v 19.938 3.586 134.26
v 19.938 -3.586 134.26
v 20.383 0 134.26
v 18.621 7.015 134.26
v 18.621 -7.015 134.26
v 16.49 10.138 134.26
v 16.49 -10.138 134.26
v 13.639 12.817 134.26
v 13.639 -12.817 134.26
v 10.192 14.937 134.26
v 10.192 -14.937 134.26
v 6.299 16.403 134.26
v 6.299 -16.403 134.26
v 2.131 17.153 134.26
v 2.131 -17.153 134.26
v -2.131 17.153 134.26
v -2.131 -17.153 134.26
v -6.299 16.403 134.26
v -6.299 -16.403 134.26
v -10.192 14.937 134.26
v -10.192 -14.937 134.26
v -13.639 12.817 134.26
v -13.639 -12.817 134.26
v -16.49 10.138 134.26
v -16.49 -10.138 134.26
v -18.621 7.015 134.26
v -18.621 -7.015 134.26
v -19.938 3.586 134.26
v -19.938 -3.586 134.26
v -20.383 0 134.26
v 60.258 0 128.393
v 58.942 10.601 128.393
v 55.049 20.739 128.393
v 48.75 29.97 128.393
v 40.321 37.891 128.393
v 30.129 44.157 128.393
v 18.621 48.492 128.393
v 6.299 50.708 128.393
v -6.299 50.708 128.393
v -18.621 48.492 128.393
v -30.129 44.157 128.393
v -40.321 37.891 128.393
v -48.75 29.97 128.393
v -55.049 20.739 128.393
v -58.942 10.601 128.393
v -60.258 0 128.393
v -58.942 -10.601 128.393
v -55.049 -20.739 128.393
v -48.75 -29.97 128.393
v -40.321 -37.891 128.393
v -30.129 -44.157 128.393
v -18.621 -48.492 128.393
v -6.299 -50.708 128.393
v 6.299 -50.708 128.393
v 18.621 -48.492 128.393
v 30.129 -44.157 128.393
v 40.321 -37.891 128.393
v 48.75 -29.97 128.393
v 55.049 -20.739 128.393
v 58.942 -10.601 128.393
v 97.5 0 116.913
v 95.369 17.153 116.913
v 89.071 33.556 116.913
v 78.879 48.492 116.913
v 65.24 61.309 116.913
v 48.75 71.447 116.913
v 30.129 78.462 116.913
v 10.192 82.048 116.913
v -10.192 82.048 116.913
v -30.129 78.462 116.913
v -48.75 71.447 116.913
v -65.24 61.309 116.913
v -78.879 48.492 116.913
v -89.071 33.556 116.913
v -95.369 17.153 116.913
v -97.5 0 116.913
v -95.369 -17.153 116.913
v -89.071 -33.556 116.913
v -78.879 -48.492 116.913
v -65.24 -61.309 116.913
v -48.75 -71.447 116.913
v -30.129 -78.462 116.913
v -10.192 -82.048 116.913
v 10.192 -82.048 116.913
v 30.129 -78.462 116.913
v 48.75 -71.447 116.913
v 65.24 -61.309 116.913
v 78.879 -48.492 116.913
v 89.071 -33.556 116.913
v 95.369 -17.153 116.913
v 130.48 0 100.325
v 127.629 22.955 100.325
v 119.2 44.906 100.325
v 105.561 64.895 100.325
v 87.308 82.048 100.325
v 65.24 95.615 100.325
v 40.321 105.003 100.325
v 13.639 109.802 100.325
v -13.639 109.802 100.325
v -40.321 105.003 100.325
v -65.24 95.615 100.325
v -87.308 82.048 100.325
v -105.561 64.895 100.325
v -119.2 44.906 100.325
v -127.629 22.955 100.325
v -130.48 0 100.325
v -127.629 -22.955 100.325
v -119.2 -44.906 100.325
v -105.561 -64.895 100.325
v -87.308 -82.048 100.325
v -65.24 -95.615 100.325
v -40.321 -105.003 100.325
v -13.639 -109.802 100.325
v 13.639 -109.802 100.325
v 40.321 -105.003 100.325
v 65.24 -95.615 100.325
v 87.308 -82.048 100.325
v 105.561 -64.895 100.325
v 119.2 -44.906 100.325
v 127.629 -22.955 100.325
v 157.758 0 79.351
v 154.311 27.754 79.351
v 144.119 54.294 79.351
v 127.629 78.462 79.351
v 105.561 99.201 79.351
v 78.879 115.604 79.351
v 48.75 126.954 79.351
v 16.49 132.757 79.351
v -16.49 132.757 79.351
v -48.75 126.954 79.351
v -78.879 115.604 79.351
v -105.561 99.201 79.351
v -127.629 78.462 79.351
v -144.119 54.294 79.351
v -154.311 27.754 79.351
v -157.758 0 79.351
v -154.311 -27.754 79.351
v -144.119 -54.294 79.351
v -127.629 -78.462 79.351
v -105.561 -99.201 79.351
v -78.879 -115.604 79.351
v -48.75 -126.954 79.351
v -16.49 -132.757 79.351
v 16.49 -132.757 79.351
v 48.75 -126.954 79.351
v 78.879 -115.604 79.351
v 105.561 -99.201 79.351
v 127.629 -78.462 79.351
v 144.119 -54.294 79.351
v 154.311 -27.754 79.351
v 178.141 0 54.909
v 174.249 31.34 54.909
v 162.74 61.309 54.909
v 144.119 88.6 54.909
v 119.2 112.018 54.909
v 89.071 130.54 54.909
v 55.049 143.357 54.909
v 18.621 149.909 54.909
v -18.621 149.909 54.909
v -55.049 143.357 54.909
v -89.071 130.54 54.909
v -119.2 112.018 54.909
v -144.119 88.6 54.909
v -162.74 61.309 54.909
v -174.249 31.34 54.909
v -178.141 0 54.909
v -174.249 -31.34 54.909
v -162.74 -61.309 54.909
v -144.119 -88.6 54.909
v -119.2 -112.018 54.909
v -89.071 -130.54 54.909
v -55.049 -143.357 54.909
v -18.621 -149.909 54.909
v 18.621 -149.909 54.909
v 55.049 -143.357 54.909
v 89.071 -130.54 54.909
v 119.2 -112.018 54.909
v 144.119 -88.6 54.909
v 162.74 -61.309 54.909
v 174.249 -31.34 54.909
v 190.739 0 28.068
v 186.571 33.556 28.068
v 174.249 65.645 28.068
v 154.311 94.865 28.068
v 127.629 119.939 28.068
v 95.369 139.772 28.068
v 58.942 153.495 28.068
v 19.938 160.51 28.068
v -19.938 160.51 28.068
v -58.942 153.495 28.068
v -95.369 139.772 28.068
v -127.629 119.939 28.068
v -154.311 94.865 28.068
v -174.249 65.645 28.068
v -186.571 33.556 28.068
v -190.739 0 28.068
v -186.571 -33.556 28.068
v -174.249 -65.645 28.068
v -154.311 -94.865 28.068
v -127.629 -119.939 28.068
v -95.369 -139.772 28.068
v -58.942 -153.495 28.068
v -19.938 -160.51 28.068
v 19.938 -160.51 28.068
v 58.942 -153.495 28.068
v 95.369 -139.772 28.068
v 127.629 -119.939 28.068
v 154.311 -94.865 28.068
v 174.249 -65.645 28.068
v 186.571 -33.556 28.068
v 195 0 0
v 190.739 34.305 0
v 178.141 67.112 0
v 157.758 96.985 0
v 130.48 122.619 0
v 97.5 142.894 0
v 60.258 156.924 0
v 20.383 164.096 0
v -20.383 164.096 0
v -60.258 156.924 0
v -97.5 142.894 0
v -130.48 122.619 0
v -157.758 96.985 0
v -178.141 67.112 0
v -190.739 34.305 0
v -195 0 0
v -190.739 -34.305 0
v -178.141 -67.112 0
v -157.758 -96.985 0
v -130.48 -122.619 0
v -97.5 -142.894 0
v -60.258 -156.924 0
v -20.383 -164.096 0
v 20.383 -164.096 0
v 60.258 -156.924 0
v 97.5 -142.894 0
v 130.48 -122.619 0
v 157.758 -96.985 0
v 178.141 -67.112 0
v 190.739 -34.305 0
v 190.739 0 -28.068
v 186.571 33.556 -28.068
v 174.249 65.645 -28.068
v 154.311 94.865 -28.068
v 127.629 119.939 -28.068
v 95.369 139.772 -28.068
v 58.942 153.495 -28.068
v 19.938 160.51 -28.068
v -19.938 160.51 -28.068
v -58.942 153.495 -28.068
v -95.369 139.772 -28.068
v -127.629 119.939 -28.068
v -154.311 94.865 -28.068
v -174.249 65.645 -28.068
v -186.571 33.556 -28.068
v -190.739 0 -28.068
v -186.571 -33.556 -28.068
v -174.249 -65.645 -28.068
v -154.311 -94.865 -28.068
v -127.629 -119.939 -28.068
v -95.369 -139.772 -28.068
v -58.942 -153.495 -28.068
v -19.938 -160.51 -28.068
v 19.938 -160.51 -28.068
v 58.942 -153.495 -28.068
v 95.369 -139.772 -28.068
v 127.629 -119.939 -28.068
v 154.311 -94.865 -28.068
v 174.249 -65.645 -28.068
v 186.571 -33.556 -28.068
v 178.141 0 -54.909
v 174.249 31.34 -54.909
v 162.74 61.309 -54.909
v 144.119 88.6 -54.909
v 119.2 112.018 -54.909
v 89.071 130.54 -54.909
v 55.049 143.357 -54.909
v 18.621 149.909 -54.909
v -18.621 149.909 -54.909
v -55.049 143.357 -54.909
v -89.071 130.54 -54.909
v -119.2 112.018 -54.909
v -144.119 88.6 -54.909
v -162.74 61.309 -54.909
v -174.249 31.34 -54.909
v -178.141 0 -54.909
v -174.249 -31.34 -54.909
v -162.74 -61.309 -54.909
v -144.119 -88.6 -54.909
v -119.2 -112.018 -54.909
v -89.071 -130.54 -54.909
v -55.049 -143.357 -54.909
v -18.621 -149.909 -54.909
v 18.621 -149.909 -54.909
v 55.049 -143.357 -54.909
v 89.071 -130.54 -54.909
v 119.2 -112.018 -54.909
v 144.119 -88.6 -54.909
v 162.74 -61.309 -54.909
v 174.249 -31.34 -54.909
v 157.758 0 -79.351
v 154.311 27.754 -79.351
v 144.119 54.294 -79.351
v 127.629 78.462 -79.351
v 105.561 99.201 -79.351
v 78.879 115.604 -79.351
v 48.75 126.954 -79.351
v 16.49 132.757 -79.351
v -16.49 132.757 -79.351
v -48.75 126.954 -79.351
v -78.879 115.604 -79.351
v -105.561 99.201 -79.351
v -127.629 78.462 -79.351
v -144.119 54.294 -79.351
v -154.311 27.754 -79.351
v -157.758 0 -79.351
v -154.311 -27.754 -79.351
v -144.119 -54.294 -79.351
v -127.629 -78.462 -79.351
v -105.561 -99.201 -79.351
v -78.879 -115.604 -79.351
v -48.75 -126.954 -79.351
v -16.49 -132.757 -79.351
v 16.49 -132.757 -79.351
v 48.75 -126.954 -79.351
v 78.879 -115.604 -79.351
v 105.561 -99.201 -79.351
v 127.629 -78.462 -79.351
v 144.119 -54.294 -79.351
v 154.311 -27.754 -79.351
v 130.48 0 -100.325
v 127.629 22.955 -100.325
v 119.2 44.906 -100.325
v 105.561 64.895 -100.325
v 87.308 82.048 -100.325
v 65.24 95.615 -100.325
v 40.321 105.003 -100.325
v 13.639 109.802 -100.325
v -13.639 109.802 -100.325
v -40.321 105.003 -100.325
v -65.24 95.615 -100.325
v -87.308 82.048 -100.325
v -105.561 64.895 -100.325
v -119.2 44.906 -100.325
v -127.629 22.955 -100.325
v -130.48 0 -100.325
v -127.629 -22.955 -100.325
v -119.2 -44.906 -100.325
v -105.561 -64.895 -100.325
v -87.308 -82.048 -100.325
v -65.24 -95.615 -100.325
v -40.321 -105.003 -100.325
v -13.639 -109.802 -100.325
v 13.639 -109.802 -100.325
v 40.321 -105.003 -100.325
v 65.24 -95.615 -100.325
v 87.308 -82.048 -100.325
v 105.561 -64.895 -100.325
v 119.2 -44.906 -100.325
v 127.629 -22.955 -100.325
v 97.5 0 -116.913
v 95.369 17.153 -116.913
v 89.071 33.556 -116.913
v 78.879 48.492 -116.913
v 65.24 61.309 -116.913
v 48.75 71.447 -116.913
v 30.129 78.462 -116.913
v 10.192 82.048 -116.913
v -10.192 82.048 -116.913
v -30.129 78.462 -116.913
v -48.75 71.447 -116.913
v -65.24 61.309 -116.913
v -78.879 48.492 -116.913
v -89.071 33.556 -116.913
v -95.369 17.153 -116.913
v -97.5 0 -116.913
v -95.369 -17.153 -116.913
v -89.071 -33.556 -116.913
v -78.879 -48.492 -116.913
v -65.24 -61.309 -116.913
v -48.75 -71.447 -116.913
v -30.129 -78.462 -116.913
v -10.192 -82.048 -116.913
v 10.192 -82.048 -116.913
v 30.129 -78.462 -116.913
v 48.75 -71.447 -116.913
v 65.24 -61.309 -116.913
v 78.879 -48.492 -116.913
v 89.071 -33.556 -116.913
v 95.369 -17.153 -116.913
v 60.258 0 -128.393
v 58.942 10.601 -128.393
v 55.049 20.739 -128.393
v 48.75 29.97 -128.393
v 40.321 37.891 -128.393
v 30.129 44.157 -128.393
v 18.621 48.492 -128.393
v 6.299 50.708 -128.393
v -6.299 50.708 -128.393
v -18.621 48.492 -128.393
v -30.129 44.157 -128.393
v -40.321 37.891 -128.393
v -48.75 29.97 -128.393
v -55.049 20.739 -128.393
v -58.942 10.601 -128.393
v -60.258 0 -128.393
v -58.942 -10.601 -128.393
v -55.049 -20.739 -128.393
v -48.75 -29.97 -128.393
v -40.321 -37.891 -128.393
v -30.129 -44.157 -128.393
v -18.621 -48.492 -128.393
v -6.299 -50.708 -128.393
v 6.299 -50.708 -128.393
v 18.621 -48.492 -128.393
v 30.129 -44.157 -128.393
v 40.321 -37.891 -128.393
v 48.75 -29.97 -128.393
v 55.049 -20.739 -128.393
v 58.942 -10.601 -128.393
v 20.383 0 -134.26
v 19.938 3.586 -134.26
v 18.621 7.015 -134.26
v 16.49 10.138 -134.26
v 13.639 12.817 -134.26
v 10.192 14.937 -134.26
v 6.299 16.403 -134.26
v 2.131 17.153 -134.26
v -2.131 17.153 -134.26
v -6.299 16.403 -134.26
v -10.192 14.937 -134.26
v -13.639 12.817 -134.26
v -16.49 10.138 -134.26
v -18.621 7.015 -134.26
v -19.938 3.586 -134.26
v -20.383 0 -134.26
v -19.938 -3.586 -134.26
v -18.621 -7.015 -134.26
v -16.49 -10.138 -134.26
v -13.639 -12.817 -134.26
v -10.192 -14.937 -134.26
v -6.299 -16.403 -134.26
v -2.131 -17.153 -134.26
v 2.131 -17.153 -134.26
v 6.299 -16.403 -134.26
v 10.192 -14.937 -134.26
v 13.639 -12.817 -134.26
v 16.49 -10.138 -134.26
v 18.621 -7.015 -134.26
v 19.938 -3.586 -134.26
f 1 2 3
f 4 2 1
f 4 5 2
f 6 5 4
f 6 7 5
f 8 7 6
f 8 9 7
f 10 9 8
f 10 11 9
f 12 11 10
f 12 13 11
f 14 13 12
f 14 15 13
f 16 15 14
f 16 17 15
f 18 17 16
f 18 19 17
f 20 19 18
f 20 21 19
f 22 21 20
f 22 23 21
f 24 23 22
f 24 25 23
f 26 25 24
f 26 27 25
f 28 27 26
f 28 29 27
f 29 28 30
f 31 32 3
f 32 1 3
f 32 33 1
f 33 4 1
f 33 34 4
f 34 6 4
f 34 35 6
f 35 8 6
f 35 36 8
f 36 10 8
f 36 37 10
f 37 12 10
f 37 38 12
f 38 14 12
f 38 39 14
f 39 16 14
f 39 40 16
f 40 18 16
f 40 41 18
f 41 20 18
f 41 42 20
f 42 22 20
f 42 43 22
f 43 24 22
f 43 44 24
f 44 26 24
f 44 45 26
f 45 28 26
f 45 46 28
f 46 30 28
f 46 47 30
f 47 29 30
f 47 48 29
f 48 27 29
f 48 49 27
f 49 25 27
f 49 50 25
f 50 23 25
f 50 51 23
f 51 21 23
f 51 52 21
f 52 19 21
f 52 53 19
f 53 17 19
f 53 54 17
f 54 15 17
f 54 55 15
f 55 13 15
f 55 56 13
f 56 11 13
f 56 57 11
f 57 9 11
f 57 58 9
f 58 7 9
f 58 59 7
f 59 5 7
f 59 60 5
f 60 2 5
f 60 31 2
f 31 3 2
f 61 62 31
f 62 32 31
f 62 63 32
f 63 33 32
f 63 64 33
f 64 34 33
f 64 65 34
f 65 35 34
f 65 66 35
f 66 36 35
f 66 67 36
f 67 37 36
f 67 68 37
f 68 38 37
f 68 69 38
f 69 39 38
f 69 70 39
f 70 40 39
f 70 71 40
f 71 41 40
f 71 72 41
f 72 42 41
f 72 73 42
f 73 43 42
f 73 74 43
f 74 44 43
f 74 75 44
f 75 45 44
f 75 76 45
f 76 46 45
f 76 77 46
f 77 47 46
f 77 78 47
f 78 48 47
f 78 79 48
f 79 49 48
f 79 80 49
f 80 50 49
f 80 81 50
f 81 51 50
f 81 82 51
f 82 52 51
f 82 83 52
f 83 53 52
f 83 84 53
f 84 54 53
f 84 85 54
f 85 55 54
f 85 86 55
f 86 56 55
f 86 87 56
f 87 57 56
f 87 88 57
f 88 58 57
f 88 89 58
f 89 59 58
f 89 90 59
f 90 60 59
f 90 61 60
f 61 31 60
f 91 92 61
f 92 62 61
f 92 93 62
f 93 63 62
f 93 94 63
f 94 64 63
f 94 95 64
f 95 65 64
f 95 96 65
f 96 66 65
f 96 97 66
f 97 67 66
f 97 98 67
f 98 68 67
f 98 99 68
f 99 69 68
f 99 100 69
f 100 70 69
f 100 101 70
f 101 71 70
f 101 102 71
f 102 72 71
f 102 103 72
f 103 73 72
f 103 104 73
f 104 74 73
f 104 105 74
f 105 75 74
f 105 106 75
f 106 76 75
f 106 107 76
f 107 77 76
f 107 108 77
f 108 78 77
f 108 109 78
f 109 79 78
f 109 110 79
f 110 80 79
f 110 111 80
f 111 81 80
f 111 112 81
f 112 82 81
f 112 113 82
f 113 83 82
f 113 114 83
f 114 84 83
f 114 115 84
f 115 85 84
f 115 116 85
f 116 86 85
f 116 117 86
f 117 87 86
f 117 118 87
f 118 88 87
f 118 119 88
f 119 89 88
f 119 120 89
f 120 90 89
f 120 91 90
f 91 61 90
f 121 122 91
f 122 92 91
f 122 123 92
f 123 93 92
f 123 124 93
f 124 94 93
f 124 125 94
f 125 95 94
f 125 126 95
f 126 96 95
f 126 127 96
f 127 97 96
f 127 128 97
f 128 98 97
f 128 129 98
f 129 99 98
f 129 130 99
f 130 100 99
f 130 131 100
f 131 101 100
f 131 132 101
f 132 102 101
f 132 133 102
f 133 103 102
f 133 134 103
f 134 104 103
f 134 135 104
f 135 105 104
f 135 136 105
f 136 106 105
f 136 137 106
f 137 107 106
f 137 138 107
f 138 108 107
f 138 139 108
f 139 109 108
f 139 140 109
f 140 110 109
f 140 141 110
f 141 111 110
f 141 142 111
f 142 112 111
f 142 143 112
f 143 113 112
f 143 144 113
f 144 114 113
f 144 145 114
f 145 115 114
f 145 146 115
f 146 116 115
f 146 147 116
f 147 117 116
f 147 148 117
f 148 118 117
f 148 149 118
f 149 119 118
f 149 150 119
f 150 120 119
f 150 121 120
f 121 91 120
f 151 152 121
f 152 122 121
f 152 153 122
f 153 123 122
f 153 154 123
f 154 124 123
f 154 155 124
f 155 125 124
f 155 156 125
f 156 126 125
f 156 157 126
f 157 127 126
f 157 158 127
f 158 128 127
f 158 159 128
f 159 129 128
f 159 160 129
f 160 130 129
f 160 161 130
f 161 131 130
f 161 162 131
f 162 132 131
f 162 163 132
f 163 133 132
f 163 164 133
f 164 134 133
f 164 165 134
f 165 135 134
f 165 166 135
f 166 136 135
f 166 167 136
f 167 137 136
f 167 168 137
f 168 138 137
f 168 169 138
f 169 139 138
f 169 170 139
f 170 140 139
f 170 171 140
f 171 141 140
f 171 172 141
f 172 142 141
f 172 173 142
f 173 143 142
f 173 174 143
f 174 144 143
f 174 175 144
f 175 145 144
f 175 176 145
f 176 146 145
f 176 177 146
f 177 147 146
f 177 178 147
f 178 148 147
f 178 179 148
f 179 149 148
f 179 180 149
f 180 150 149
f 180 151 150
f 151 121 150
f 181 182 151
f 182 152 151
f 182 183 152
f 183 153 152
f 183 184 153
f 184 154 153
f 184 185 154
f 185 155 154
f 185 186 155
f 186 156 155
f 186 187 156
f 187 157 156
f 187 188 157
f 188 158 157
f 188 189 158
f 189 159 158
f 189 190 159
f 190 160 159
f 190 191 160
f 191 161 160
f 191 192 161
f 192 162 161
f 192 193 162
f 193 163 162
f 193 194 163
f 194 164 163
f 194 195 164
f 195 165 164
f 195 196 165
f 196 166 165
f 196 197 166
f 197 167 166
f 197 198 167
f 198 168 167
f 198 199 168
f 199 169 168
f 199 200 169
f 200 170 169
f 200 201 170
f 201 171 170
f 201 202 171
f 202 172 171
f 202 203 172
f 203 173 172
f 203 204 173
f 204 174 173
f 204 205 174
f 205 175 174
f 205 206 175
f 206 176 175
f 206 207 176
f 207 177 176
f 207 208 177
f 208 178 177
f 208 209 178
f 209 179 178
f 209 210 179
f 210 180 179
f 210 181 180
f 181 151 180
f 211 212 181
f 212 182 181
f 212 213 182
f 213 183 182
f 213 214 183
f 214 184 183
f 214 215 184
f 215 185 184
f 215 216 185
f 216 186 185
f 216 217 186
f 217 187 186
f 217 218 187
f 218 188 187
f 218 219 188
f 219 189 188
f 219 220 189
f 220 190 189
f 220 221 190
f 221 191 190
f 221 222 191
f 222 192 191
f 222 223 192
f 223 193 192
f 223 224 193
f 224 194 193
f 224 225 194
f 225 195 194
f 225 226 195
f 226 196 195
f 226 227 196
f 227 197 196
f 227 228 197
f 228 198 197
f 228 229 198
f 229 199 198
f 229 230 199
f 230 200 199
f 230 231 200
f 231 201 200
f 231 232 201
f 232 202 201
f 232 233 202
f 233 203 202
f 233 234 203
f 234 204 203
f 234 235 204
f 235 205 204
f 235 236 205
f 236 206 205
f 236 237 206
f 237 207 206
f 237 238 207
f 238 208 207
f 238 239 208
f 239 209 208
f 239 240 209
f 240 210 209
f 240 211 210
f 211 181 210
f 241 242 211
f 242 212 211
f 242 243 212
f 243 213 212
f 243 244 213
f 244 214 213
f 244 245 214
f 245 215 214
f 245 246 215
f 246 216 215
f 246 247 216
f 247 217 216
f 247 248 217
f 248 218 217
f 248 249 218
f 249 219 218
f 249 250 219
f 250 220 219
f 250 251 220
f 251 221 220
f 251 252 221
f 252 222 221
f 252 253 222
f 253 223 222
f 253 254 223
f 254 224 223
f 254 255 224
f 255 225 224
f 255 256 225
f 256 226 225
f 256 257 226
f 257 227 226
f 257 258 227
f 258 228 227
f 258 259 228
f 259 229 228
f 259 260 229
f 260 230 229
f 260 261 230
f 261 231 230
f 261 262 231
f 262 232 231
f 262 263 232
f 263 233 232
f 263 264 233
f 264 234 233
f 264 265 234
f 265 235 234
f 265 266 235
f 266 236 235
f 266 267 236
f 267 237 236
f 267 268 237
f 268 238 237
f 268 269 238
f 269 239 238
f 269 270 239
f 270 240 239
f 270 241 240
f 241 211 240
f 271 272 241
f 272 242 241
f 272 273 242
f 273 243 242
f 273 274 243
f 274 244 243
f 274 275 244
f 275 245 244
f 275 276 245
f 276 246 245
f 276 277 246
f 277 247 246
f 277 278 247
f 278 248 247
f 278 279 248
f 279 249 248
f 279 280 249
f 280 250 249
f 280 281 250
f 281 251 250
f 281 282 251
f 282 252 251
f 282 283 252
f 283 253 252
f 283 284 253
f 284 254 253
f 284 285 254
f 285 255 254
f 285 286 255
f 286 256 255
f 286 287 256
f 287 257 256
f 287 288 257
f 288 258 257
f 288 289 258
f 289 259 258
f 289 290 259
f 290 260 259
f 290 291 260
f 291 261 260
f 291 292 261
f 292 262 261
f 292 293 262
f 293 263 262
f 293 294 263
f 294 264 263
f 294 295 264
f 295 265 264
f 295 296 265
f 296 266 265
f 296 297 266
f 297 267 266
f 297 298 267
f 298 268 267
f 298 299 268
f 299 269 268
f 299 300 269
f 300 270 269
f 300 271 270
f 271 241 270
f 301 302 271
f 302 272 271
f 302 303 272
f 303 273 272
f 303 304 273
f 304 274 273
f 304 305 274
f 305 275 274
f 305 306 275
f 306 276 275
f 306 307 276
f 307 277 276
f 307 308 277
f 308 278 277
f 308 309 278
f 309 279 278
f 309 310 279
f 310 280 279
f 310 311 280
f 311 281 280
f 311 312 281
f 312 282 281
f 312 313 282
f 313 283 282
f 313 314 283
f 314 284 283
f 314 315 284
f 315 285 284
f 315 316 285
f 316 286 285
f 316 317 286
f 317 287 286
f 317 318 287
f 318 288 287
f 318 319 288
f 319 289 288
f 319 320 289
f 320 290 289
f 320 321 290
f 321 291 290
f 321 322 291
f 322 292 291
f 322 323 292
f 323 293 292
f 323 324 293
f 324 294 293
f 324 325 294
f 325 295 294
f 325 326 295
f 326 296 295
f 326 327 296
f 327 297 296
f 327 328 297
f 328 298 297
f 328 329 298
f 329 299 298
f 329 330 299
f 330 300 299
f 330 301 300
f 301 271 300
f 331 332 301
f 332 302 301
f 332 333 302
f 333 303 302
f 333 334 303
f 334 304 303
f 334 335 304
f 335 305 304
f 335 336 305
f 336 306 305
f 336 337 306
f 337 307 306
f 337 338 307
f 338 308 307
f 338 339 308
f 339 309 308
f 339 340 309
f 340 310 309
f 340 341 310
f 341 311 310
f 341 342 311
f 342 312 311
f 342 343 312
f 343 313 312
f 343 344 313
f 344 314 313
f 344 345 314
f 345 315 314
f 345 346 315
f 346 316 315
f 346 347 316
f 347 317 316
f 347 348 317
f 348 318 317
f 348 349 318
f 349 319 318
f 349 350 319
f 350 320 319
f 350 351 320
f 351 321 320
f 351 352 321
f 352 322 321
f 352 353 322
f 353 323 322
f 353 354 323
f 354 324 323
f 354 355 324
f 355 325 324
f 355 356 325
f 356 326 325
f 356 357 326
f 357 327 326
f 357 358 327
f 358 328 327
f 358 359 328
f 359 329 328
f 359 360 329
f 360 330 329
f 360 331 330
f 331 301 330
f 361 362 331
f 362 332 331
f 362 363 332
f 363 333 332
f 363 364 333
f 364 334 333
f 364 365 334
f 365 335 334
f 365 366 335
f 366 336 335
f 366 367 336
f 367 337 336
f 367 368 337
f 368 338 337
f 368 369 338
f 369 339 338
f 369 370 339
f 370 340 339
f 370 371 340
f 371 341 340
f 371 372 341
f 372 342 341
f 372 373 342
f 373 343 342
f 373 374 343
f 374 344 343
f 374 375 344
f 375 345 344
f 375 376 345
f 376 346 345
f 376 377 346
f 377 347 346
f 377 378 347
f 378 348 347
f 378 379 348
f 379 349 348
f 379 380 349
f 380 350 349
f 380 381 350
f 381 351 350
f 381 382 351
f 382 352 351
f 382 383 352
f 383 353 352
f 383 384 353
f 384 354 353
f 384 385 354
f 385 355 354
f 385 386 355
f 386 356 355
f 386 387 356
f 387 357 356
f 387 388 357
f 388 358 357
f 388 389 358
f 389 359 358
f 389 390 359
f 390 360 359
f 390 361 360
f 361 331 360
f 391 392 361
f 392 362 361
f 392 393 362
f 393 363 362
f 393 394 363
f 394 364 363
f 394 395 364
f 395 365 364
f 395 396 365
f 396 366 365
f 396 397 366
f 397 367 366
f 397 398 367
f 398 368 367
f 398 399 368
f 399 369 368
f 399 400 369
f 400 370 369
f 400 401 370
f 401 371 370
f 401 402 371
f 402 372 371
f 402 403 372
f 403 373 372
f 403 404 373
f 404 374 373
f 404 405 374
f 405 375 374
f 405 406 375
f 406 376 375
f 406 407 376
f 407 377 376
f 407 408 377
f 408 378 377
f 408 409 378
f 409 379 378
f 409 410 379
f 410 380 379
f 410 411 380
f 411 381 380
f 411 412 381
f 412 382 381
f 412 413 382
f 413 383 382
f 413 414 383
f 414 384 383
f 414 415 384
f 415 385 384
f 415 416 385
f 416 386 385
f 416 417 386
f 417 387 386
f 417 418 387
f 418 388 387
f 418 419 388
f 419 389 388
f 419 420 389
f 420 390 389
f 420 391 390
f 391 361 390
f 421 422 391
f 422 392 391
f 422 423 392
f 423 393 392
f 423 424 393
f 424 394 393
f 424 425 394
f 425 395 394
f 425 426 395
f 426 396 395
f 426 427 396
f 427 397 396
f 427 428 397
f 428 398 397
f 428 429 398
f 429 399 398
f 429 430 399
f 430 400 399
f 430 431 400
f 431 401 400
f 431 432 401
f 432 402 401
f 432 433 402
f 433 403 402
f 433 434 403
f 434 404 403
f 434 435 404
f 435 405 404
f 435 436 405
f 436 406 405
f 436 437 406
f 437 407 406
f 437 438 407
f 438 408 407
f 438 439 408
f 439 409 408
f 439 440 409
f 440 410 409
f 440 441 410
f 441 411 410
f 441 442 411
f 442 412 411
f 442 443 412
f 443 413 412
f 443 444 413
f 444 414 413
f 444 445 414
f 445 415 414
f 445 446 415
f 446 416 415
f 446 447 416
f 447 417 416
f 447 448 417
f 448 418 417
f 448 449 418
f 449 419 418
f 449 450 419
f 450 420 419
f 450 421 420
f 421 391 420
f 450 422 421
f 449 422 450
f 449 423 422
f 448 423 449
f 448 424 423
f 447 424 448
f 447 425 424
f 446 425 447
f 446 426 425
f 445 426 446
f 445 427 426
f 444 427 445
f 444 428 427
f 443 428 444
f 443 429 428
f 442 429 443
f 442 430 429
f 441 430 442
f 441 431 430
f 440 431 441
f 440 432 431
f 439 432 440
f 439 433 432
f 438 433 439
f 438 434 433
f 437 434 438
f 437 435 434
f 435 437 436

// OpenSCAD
// Generated by SolidPython 1.0.1 on 2020-07-29 00:46:50


scale(v = [13, 11, 9]) {
	sphere(r = 15);
}
/***********************************************
*********      SolidPython code:      **********
************************************************
 
# import packages: SolidPython
from solid import *
from solid.utils import *
from itertools import chain, combinations, permutations


class Resize:

    def __init__(self, scad_file):
        self.scad_file = scad_file
        #self.scad_file = import_scad(scad_file)
        # cone/cylinder param:
        self.r1 = 0
        self.r2 = 0
        self.h = 0
        # rectangular prism param:
        self.w = 0
        self.l = 0
        # ellipse param:
        self.r = 0

    # import OpenScad code (file name corresponds to shape)


    # classify shape + parameters
    def assign(self, param1, param2, param3):
        if self.scad_file == 'cone.scad':
            self.r1 = param1
            self.r2 = param2
            self.h = param3
        elif self.scad_file == 'cylinder.scad':
            self.r1 = param1
            self.r2 = param2
            self.h = param3
        elif self.scad_file == 'rectangularPrism.scad':
            self.h = param1
            self.l = param2
            self.w = param3
        else:
            self.r = param1
            self.h = param2

    # resize parameters
    def iterate(self):
        x = range(3, 20, 2)
        i = 1
        if self.scad_file == 'cone.scad':
            tempList = list(permutations(x, 2))
            for temp in tempList:
                param1 = temp[0]
                param2 = temp[1]
                filepath = 'produced_scad_files/' + 'cone' + str(param1) + '_' + str(param2) + '_' + '.scad'
                scad_render_to_file(cylinder(h=param1, r1=param2, r2=0), filepath)

        elif self.scad_file == 'cylinder.scad':
            tempList = list(permutations(x, 3))
            for temp in tempList:
                param1 = temp[0]
                param2 = temp[1]
                filepath = 'produced_scad_files/' + 'cylinder' + str(param1) + '_' + str(param2) + '_' + '.scad'
                scad_render_to_file(cylinder(h=param1, r1=param2, r2=param2), filepath)

        elif self.scad_file == 'rectangularPrism.scad':
            tempList = list(permutations(x, 3))
            for temp in tempList:
                param1 = temp[0]
                param2 = temp[1]
                param3 = temp[2]
                filepath = 'produced_scad_files/' + 'rectangularPrism' + str(param1) + '_' + str(param2) + '_' + str(
                    param3) + '.scad'
                scad_render_to_file(cube(size=(param1, param2, param3)), filepath)

        elif self.scad_file == 'ellipse.scad':
            tempList = list(permutations(x, 4))
            for temp in tempList:
                param1 = temp[0]
                param2 = temp[1]
                param3 = temp[2]
                param4 = temp[3]
                filepath = 'produced_scad_files/' + 'ellipse' + str(param1) + '_' + str(param2) + '_' + str(param3) + '_' + str(param4) + '.scad'
                scad_render_to_file(scale([param1, param2, param3])(sphere(r=param4)), filepath)

    def render_to_scadfile(self):
        scad_render_to_file(scad, 'example.scad') 
 
************************************************/
